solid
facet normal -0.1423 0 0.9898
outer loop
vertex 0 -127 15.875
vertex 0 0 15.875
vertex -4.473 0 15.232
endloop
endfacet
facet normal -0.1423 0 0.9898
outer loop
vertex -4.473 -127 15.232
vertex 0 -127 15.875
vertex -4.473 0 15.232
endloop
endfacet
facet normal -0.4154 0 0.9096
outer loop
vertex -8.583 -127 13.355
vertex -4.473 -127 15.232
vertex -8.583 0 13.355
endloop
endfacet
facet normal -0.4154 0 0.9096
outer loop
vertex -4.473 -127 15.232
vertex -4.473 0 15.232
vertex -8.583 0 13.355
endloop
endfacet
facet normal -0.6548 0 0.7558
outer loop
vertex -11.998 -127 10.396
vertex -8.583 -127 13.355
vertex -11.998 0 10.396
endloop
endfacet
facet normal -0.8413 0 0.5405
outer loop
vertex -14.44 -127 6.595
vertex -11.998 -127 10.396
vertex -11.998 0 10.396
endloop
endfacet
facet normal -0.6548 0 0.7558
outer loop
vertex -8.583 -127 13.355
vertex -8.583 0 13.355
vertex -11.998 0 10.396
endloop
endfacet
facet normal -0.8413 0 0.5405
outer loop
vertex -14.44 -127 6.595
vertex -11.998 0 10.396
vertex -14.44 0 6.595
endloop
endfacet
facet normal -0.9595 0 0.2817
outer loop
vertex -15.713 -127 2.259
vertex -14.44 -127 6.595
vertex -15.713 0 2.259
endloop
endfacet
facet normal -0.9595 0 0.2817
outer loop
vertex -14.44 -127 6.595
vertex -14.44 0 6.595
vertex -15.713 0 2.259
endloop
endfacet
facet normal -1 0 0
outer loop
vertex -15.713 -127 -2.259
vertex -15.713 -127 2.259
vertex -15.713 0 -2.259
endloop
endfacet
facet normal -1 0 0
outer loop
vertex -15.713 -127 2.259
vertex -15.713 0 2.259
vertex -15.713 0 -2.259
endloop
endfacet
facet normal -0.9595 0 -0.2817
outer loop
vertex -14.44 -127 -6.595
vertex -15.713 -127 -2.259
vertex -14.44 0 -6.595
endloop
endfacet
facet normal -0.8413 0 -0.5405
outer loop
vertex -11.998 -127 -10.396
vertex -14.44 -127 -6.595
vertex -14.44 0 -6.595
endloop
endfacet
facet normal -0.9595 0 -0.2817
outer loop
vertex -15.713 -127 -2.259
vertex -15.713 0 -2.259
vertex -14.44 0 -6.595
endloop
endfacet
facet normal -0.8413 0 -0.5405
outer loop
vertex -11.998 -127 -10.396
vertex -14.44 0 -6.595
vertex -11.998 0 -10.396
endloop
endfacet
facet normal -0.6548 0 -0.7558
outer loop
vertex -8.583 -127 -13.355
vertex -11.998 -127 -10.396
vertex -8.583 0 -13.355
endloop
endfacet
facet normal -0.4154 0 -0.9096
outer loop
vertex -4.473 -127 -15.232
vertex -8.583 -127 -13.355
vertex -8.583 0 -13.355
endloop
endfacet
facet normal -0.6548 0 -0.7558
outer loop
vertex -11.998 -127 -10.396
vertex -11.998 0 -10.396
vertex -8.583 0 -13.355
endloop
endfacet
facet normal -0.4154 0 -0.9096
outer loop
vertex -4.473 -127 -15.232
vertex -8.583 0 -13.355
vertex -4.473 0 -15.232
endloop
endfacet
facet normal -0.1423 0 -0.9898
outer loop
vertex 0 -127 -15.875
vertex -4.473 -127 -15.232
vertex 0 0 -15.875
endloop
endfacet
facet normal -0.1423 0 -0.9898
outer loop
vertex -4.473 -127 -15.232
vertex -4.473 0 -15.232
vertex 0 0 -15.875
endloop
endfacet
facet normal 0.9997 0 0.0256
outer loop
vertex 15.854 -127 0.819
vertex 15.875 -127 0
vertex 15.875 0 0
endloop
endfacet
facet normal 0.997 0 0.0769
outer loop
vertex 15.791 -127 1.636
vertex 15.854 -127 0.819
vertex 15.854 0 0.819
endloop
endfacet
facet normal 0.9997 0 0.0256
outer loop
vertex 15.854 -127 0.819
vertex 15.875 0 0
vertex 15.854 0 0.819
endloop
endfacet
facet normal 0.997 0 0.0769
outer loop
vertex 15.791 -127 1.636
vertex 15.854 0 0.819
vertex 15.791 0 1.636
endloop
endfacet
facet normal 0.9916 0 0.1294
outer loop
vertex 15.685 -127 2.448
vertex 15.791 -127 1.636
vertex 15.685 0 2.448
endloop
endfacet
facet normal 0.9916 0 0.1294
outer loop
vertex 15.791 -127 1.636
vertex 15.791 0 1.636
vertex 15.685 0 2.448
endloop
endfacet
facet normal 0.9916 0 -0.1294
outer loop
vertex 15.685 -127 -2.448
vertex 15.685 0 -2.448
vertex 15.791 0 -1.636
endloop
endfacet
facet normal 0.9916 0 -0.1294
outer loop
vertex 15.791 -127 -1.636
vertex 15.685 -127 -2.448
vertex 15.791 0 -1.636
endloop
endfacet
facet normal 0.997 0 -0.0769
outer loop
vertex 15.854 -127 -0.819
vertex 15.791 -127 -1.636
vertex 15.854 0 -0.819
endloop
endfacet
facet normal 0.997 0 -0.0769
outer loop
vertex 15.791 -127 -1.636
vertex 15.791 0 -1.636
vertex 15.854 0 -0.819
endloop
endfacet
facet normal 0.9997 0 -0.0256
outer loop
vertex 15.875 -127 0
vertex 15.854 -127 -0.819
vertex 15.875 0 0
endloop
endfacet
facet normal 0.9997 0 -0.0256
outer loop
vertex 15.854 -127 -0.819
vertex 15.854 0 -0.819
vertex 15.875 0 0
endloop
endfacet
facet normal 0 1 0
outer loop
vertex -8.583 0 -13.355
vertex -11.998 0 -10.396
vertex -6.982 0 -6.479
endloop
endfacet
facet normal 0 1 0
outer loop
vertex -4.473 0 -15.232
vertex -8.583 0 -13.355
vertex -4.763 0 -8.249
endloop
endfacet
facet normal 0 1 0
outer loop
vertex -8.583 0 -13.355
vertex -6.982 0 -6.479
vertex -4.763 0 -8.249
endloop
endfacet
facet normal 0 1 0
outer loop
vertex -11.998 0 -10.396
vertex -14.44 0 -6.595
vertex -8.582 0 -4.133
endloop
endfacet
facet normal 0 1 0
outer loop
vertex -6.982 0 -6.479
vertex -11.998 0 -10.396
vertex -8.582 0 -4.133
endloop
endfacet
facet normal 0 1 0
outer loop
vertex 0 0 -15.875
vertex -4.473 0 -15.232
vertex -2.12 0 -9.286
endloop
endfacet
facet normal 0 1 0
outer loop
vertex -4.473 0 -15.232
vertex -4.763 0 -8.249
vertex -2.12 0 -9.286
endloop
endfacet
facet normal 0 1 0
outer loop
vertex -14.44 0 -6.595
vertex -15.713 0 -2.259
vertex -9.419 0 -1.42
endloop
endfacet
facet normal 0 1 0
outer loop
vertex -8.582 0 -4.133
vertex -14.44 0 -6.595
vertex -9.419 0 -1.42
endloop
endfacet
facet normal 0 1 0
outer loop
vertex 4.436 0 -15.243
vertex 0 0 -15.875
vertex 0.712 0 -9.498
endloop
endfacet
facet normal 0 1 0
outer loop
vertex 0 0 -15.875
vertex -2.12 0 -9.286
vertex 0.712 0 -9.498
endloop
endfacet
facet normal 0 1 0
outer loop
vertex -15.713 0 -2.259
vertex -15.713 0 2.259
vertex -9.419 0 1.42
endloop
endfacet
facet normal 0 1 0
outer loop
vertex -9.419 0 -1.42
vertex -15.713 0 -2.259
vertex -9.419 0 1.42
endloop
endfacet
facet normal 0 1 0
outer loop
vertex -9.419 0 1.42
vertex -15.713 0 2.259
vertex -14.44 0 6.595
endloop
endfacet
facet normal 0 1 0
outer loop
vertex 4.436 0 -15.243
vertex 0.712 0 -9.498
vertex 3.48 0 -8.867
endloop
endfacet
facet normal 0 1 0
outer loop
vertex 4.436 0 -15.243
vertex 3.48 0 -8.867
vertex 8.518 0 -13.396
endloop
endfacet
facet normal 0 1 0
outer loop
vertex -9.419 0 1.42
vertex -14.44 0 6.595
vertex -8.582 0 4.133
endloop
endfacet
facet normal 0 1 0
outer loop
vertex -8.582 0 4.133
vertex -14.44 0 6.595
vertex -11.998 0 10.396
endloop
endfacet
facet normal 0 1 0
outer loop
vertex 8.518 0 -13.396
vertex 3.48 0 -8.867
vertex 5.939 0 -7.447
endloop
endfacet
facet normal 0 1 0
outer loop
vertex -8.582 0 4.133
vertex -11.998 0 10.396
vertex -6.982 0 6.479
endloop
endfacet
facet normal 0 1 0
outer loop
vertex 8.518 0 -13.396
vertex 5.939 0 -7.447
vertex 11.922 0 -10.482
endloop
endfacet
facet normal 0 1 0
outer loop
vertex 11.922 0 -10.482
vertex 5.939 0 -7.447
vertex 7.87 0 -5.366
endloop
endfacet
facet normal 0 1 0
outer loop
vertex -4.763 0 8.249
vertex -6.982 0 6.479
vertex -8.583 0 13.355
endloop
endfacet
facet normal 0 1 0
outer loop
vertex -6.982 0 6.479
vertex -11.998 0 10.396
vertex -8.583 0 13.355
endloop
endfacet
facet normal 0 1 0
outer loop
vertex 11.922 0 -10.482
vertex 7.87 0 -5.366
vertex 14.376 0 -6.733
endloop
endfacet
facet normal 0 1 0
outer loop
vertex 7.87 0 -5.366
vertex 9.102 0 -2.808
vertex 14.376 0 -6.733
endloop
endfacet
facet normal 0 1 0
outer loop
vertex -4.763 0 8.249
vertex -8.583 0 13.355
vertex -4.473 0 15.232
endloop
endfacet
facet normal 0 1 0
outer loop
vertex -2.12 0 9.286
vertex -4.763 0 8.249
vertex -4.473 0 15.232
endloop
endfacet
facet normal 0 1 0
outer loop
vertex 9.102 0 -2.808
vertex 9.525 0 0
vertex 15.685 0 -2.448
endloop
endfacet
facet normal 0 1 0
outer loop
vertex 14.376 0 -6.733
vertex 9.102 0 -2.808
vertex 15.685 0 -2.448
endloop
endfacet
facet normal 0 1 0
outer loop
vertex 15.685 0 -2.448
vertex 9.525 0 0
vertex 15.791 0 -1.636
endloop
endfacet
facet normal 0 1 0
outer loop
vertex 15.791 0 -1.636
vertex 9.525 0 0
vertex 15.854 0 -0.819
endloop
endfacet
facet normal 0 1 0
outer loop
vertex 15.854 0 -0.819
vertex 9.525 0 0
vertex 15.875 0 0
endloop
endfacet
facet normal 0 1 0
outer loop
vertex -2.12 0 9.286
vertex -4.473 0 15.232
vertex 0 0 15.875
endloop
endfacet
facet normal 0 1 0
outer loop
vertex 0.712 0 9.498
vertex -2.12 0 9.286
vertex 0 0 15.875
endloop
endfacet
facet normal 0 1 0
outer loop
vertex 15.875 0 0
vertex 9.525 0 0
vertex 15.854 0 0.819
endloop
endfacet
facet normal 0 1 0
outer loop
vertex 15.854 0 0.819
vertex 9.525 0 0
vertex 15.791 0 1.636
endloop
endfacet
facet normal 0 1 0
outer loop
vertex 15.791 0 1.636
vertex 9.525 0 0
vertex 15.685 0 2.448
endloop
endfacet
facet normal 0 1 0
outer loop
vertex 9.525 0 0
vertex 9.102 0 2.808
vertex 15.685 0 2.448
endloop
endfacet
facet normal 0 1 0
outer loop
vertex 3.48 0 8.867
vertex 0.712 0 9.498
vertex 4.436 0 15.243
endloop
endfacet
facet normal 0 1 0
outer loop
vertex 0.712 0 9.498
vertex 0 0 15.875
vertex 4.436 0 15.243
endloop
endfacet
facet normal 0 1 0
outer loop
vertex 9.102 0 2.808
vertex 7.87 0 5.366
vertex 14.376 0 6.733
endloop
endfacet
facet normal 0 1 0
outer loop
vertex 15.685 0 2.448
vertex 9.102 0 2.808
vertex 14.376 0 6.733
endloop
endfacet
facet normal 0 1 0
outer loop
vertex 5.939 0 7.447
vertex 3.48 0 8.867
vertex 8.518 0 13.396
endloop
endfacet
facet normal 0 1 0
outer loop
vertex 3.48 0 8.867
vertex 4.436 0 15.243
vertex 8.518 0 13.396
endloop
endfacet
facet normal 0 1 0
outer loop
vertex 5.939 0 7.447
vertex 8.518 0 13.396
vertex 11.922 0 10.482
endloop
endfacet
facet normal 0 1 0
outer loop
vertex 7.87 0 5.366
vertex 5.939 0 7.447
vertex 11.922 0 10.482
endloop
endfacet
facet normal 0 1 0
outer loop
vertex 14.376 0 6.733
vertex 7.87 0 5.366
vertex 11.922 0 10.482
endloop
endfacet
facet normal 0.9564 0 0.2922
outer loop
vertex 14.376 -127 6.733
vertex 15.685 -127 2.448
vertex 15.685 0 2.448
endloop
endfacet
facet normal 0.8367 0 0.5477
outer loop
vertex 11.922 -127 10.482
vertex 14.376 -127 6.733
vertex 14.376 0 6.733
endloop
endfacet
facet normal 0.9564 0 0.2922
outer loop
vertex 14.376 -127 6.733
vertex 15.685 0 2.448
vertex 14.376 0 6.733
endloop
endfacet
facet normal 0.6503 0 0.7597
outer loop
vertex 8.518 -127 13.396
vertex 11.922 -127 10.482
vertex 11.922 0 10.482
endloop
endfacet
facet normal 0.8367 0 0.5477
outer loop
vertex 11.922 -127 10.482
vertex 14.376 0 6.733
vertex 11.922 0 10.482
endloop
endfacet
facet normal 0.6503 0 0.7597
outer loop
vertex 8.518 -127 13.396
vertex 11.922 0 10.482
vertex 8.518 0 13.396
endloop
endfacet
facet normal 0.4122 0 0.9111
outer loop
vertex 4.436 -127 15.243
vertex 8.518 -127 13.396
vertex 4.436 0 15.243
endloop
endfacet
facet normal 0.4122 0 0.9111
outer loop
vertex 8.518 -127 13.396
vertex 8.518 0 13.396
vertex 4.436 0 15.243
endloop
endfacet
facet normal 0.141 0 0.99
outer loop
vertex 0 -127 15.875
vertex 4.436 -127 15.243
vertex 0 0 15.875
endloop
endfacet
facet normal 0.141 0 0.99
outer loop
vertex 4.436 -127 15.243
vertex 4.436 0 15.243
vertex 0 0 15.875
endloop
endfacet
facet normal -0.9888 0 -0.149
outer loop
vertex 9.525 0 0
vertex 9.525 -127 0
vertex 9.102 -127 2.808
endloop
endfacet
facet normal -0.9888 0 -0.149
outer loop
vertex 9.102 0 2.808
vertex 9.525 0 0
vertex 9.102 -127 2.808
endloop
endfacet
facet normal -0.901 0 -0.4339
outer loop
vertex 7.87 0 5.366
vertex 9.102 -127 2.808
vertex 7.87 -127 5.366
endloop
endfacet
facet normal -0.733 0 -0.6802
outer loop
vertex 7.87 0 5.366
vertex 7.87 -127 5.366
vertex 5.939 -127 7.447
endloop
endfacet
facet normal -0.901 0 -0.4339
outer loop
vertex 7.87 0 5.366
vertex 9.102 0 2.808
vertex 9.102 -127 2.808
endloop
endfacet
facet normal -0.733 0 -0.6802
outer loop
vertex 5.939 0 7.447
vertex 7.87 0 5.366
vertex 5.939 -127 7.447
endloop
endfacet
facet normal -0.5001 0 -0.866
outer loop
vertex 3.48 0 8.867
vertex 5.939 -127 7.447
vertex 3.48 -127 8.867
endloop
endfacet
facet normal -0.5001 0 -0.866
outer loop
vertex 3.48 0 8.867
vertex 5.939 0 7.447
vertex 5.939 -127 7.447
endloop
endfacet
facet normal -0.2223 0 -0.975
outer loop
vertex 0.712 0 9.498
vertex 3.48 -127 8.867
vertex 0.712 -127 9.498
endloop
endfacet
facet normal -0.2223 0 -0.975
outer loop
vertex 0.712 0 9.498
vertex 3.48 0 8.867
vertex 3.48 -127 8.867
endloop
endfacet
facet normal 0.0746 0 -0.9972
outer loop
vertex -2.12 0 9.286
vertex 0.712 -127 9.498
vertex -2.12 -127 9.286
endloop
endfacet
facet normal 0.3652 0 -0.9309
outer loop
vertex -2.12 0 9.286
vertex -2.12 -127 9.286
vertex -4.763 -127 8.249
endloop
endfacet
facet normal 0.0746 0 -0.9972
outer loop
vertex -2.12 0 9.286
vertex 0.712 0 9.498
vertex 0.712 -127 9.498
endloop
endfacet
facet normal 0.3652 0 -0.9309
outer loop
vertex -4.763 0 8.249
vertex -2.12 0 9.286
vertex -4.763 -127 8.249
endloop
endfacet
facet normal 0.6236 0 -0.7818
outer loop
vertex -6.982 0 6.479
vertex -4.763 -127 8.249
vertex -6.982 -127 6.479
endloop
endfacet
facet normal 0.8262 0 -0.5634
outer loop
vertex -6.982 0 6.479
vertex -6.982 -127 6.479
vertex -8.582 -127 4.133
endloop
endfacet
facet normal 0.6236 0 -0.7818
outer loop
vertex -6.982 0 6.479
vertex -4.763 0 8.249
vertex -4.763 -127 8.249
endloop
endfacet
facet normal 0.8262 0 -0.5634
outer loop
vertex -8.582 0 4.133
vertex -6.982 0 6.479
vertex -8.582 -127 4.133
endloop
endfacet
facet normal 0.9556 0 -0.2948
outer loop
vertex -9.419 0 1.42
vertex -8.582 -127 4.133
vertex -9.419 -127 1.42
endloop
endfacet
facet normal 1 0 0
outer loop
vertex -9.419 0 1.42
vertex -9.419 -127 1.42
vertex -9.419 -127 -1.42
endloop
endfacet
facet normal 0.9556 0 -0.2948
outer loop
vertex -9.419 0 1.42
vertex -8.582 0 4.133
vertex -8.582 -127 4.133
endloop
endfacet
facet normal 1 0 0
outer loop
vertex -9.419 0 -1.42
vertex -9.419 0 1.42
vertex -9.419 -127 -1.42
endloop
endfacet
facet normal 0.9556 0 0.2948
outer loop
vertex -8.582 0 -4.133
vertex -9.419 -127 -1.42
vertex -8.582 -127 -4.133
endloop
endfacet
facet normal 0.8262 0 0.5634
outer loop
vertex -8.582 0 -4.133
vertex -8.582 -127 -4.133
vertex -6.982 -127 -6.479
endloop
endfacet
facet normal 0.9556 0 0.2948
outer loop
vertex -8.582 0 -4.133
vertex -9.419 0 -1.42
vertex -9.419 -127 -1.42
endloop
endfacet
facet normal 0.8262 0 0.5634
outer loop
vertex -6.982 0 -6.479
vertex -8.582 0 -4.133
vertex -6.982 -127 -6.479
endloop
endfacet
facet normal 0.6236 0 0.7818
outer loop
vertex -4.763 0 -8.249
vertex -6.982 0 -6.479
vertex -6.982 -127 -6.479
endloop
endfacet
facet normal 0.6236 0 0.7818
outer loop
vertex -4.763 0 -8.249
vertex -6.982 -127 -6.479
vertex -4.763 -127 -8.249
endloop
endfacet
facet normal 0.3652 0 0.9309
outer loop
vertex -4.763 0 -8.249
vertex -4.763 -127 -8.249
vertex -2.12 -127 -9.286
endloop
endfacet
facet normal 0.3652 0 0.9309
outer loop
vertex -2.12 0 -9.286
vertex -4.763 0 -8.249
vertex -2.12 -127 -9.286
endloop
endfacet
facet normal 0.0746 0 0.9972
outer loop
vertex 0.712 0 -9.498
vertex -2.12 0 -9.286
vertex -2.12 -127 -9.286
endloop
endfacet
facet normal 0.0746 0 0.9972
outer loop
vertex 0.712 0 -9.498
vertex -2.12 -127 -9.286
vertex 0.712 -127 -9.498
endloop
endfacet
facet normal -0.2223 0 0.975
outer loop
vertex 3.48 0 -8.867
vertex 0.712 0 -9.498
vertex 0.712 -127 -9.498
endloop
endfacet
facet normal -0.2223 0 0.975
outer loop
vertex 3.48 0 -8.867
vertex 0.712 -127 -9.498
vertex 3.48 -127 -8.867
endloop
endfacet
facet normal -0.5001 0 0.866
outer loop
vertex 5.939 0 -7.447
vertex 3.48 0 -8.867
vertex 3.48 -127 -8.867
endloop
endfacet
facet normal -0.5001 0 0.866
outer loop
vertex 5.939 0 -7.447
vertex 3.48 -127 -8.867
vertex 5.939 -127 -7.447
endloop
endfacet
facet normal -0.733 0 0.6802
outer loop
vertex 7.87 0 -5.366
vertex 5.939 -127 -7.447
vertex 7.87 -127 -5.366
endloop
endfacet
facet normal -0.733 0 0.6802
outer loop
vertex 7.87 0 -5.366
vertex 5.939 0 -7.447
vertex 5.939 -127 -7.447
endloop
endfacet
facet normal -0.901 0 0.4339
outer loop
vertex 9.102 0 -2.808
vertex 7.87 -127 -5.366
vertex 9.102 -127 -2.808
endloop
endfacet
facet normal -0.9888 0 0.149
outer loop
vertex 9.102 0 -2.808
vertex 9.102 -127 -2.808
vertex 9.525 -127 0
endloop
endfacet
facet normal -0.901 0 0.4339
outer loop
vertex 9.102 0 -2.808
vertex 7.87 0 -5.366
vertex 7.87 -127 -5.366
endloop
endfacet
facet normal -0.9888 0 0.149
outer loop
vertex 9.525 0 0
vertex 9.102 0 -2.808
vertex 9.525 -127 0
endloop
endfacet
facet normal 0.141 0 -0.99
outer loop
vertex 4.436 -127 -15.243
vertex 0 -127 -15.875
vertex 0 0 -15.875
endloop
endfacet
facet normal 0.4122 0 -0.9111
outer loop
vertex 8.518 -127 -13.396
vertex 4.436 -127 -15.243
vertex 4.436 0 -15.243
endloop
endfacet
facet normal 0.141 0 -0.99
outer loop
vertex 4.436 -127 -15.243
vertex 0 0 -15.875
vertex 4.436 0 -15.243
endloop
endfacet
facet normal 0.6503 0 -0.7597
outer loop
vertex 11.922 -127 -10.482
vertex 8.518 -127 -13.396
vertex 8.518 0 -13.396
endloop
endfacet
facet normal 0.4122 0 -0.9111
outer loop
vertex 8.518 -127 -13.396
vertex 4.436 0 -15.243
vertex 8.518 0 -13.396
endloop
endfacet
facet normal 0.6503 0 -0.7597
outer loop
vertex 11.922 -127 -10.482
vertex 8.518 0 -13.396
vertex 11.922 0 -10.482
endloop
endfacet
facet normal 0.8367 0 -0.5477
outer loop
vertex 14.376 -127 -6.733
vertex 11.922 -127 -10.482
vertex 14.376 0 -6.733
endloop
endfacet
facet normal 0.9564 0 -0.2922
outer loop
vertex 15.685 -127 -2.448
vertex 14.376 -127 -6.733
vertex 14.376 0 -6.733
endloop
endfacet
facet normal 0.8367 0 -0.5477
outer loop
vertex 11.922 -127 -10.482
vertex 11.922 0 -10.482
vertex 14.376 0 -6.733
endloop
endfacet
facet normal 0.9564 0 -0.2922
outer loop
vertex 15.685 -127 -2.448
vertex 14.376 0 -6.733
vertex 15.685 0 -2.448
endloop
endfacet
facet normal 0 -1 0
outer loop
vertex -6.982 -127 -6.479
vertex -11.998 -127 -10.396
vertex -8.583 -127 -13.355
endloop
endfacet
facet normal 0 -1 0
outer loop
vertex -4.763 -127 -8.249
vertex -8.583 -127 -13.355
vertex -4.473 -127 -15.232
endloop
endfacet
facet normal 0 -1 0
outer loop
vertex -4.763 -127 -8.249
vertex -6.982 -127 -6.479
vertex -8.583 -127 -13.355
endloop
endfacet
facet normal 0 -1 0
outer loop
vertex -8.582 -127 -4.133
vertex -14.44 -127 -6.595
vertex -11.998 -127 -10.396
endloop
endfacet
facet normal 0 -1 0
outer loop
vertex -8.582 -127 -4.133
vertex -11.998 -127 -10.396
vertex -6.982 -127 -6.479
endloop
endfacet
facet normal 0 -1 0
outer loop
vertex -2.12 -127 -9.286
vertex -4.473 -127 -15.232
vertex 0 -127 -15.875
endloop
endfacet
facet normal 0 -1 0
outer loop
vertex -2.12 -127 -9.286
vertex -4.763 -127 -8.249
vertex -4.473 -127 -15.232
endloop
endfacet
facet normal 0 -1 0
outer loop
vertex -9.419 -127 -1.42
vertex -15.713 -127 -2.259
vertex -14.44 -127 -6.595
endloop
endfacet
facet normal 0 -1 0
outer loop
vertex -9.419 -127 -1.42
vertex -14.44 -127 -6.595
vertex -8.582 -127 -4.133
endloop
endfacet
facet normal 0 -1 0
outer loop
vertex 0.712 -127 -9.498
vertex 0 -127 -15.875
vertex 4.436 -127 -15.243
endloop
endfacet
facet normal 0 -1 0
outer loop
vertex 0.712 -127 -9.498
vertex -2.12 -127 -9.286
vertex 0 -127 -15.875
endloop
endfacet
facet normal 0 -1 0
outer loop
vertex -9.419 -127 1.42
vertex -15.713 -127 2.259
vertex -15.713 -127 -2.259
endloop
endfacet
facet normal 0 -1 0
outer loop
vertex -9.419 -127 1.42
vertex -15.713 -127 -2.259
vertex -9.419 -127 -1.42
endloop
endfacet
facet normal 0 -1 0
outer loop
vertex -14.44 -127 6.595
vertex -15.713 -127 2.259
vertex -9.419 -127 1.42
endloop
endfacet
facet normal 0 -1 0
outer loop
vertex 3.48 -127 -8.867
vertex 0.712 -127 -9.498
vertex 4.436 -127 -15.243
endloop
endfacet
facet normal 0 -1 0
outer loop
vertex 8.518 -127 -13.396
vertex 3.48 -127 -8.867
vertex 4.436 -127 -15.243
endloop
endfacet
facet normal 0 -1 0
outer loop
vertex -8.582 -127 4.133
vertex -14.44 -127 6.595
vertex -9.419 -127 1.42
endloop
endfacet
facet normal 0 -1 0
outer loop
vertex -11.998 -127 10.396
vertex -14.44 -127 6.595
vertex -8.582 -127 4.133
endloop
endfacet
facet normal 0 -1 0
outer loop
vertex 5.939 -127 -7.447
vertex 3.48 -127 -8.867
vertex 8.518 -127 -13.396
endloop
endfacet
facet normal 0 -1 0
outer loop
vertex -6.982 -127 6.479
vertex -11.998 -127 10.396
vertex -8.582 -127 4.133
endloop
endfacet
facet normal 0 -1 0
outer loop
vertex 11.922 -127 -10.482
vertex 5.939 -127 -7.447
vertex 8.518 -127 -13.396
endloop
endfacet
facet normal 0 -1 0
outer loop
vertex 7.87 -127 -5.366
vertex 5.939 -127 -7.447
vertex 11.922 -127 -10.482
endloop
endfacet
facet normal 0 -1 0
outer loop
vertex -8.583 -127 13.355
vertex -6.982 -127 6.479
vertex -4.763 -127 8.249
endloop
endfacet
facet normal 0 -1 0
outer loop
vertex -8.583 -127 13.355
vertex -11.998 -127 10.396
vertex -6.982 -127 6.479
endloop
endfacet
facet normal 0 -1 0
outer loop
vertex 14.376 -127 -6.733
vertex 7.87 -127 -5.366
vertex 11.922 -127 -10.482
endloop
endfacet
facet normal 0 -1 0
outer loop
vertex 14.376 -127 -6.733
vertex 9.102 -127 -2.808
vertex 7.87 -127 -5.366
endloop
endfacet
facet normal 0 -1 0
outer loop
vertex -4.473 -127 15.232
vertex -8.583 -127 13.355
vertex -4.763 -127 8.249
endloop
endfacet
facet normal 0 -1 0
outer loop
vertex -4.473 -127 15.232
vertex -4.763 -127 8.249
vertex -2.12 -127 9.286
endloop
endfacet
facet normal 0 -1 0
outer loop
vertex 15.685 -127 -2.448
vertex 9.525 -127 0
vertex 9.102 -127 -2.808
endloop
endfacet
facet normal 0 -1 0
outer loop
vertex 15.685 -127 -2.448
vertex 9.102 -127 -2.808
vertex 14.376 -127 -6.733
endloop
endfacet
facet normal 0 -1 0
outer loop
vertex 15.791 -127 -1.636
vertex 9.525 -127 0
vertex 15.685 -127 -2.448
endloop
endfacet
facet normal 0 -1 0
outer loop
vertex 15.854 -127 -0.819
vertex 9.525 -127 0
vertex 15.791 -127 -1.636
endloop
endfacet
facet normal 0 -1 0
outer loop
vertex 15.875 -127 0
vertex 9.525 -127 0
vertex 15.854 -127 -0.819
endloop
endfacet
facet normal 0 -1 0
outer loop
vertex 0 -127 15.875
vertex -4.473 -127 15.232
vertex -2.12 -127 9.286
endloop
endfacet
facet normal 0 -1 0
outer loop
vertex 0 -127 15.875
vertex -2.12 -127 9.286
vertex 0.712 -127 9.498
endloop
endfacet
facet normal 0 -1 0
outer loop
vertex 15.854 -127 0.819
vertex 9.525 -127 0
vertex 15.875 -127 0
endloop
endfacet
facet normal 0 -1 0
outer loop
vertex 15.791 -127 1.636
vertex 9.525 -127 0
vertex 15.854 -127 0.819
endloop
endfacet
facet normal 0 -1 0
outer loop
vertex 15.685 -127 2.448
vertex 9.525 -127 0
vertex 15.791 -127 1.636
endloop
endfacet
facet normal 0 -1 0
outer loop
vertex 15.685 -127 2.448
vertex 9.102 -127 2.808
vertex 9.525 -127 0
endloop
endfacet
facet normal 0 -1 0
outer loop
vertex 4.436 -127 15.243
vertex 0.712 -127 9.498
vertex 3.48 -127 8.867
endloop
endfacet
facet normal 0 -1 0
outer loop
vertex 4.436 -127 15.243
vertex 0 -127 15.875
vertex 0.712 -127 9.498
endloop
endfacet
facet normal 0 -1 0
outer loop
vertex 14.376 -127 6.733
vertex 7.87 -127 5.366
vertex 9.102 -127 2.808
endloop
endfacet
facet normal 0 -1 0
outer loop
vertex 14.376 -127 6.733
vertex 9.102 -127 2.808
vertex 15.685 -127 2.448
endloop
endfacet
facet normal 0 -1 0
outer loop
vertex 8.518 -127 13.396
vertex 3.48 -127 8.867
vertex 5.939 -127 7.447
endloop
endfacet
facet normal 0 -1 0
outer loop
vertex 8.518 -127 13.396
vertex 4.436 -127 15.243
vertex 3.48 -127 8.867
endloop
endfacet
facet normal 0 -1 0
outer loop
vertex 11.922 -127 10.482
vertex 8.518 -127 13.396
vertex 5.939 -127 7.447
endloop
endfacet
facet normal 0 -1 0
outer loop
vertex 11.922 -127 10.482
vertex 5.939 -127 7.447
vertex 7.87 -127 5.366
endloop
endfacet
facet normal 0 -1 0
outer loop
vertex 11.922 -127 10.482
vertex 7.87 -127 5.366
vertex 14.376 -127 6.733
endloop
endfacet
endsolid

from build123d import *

# Parameters (mm, degrees)
F0_R     = 9.525
F1_DEPTH = 127


with BuildPart() as f1:
    # F0 (on Front) → F1 (new body)
    with BuildSketch(Plane.XZ):
        with BuildLine():
            ThreePointArc((15.685102, -2.448103), (15.827454, -1.227728), (15.875, 0))
            ThreePointArc((15.875, 0), (15.827454, 1.227728), (15.685102, 2.448103))
            ThreePointArc((15.685102, 2.448103), (10.323565, 12.059835), (0, 15.875))
            ThreePointArc((0, 15.875), (-15.875, 0), (0, -15.875))
            ThreePointArc((0, -15.875), (10.323565, -12.059835), (15.685102, -2.448103))
        make_face()
        Circle(F0_R, mode=Mode.SUBTRACT)
    extrude(amount=F1_DEPTH)


solid = f1.part
